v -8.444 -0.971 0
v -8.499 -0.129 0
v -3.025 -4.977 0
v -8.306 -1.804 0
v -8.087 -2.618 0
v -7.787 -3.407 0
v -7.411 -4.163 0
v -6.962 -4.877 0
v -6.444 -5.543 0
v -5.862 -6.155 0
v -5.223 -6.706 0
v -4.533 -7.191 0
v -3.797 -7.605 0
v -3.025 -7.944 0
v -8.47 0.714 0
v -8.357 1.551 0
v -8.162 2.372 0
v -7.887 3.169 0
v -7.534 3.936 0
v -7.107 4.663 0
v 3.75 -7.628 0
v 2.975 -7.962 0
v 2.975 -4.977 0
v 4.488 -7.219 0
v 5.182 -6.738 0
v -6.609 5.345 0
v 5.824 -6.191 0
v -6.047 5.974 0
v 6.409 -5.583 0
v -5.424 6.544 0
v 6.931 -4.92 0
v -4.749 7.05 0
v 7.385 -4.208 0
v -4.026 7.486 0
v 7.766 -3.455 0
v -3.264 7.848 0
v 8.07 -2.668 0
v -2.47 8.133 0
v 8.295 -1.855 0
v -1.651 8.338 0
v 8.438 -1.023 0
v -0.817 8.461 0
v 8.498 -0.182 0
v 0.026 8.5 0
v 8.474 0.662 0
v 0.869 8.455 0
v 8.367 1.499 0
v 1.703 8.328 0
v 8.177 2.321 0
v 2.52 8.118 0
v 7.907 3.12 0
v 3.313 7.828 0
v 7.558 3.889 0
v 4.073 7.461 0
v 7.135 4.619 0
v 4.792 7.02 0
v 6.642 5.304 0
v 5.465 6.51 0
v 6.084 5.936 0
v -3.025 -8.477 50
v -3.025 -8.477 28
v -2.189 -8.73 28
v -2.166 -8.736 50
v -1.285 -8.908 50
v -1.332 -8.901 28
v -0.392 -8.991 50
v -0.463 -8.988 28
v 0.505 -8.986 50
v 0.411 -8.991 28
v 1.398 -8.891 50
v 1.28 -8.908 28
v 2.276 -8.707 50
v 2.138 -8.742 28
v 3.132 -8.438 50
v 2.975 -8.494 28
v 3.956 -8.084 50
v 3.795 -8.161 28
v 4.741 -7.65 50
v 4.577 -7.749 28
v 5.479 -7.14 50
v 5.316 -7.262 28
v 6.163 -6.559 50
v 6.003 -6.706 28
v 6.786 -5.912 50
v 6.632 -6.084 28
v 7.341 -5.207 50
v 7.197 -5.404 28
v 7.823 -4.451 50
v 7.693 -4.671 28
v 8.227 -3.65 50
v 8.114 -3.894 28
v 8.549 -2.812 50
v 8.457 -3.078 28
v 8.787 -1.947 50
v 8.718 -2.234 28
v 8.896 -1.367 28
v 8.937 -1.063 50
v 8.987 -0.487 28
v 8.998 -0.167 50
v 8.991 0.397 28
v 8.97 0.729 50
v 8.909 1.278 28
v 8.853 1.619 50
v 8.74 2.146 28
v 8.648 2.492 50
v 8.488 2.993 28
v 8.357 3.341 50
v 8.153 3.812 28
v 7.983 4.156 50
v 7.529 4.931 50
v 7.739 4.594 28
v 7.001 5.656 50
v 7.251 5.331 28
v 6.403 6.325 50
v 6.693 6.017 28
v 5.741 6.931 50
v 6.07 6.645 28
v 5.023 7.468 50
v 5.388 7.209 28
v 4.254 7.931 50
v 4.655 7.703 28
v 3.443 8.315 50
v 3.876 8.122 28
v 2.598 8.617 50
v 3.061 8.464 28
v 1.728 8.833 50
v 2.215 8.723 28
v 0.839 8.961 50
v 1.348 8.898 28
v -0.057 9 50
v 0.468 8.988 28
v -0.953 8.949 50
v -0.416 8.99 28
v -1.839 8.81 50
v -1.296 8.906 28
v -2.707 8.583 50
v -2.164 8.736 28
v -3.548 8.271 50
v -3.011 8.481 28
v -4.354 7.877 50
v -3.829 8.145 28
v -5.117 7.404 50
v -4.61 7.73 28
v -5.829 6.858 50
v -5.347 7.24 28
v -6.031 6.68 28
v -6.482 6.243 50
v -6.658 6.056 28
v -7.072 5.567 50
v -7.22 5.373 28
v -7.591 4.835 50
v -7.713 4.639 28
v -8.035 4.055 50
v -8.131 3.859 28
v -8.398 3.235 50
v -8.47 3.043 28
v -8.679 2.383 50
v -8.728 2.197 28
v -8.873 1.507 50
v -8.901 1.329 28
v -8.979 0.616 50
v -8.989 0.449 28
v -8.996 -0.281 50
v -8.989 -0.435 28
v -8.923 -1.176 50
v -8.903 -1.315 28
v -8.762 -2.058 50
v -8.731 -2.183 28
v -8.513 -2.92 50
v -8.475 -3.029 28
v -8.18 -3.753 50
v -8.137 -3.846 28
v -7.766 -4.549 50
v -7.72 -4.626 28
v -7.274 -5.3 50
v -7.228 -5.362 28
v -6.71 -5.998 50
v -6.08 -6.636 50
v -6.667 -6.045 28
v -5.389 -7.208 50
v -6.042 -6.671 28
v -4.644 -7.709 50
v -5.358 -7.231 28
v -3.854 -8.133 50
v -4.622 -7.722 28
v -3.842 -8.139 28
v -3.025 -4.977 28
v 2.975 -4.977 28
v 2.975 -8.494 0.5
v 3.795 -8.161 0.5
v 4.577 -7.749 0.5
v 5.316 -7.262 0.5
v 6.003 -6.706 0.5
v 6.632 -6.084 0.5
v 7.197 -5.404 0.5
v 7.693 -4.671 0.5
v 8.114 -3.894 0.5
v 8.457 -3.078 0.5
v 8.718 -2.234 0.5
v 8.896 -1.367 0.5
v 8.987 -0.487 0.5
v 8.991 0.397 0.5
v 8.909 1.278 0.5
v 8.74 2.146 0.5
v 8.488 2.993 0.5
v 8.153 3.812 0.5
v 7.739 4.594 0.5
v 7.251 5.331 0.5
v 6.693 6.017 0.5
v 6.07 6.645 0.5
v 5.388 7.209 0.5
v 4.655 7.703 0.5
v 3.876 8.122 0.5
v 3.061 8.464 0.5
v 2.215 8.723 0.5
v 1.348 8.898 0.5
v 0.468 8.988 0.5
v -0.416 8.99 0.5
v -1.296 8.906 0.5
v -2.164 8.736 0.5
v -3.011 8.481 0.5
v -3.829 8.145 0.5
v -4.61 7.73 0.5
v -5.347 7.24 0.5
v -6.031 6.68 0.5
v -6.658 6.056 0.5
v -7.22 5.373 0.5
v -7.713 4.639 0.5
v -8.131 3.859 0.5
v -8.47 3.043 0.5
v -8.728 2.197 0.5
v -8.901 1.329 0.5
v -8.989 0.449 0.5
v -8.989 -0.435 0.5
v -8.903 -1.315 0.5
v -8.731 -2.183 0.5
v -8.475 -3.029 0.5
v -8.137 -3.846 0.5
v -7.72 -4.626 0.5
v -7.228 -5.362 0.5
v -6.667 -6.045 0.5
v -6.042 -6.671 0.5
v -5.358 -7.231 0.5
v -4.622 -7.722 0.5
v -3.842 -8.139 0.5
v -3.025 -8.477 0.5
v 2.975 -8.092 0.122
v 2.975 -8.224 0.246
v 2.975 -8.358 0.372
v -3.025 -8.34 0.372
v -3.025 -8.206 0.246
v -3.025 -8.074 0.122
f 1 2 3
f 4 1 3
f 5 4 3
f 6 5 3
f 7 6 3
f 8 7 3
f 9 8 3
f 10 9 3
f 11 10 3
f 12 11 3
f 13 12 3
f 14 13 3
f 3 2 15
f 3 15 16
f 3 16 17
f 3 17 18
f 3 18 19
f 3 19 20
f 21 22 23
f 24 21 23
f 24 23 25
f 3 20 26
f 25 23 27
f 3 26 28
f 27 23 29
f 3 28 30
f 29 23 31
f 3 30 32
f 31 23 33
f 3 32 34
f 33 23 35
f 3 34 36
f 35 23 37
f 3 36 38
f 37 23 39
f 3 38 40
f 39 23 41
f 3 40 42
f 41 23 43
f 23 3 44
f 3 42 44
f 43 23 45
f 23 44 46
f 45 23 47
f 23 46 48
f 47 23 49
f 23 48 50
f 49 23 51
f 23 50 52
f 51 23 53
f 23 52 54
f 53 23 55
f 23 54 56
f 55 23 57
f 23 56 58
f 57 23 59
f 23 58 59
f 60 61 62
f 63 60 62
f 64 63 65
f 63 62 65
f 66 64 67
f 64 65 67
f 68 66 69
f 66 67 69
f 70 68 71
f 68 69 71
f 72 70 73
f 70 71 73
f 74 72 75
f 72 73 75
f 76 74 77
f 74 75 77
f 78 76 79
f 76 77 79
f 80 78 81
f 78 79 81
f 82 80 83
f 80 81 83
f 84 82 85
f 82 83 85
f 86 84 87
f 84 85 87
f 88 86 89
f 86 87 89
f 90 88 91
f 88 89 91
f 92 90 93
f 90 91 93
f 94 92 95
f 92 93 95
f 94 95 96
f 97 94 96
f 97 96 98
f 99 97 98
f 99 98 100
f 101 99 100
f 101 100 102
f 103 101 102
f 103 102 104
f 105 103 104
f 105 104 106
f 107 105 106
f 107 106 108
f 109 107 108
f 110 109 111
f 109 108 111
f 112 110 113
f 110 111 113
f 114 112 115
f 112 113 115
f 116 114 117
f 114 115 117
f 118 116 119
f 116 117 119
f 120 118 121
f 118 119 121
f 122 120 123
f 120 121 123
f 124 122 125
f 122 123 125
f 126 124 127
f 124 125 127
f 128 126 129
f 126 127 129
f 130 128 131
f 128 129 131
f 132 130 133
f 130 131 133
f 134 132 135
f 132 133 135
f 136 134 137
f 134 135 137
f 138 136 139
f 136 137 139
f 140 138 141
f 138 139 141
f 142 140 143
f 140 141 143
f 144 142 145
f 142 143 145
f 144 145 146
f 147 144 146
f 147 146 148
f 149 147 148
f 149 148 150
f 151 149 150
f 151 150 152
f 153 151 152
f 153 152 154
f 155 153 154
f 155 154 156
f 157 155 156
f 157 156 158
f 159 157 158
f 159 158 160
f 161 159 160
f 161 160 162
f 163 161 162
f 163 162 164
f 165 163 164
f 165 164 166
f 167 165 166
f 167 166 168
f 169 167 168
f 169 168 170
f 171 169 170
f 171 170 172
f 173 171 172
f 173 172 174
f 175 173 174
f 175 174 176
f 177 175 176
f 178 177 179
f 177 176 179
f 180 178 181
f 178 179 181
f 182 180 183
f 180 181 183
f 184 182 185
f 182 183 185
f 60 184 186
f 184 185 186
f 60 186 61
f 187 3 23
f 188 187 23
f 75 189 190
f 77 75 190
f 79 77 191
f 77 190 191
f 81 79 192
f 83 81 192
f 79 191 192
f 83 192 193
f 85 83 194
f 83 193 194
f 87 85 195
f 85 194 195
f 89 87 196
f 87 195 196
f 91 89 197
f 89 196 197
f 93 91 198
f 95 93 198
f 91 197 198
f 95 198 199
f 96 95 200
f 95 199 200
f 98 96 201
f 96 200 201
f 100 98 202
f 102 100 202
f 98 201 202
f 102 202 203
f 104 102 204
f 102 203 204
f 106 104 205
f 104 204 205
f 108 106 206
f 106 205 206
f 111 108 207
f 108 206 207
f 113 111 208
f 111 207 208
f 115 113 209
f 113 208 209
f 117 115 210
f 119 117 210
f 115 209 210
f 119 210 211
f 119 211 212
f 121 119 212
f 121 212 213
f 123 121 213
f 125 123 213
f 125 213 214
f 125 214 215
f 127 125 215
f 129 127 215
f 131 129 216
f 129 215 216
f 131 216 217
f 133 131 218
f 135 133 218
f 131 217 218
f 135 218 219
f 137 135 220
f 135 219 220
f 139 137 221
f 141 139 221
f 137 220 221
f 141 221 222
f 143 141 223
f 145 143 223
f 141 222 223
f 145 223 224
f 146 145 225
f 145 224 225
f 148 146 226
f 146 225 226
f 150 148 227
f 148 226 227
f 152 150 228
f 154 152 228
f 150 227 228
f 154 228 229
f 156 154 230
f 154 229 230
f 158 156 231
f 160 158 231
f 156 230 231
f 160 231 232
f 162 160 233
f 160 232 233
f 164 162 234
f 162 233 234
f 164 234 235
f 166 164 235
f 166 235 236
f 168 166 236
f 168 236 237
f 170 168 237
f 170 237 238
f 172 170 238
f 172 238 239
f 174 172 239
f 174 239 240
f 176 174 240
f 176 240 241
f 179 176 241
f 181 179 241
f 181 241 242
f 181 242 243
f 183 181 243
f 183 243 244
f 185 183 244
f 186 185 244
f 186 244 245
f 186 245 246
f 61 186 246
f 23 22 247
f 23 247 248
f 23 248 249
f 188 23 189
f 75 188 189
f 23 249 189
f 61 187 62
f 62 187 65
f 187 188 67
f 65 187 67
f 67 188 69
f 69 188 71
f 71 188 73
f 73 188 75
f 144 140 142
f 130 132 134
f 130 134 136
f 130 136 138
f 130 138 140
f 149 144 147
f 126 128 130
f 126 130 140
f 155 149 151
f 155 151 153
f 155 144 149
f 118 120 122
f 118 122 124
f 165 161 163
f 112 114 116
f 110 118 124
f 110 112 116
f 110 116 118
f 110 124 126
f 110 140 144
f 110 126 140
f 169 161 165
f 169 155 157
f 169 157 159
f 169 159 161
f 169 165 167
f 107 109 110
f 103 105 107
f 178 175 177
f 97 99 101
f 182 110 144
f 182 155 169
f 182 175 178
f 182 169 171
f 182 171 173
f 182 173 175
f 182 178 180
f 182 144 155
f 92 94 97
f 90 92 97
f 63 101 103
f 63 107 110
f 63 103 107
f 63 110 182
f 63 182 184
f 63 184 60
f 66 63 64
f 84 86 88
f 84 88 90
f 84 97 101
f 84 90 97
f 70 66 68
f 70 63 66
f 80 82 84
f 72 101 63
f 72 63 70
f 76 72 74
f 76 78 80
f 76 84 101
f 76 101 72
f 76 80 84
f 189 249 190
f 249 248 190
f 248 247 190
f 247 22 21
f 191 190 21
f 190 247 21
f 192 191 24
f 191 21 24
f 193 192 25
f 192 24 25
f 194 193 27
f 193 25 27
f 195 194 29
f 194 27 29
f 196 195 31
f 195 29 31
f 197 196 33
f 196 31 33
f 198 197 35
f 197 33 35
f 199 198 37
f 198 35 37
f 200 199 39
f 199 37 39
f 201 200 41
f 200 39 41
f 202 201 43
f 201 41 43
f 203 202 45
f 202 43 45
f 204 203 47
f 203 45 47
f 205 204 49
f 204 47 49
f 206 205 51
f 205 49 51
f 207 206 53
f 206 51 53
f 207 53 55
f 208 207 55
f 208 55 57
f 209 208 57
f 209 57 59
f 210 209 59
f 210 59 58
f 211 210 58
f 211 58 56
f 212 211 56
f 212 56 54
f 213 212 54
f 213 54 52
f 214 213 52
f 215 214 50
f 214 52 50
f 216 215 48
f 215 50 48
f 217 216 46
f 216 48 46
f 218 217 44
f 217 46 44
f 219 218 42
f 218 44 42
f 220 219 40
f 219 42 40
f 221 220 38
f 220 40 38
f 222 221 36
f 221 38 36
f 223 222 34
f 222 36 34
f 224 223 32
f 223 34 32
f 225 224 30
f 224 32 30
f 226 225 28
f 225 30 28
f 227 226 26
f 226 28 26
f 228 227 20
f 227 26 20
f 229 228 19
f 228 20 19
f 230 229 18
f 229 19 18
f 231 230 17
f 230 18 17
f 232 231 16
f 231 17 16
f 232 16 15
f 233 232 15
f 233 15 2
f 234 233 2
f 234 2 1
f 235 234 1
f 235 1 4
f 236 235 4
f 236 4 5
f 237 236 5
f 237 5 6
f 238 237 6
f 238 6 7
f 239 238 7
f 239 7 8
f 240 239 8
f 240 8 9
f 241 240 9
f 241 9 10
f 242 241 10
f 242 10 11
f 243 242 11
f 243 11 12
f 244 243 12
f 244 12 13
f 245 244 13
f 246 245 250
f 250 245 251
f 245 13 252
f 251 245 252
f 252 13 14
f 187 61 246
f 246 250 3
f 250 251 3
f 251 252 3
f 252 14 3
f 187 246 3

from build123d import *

# Parameters (mm, degrees)
RESSALTO_EXTRUS_O1_DEPTH = 28
ESBO_O3_R                = 9
RESSALTO_EXTRUS_O2_DEPTH = 22
CHANFRO2_SIZE            = 0.5


with BuildPart() as part:
    # Esboço2 → Ressalto-extrusão1 (new body)
    with BuildSketch(Plane.XY):
        with BuildLine():
            Line((-3.024645143, -8.476527695), (-3.024645143, -4.976527695))
            Line((-3.024645143, -4.976527695), (2.975354857, -4.976527695))
            Line((2.975354857, -4.976527695), (2.975354857, -8.493954525))
            ThreePointArc((2.975354857, -8.493954525), (0.026140135, 8.999962038), (-3.024645143, -8.476527695))
        make_face()
    extrude(amount=RESSALTO_EXTRUS_O1_DEPTH)

    # Esboço3 → Ressalto-extrusão2 (add)
    with BuildSketch(Plane.XY.offset(28)):
        with Locations(Location((0, 0, 0), (0, 0, 250.362280418))):
            Circle(ESBO_O3_R)
    extrude(amount=RESSALTO_EXTRUS_O2_DEPTH)

    # Chanfro2
    chanfro2_edges = [part.edges().sort_by_distance(p)[0] for p in [
        (0.026140135, 8.999962038, 0),
    ]]
    chamfer(chanfro2_edges, length=CHANFRO2_SIZE)


solid = part.part
